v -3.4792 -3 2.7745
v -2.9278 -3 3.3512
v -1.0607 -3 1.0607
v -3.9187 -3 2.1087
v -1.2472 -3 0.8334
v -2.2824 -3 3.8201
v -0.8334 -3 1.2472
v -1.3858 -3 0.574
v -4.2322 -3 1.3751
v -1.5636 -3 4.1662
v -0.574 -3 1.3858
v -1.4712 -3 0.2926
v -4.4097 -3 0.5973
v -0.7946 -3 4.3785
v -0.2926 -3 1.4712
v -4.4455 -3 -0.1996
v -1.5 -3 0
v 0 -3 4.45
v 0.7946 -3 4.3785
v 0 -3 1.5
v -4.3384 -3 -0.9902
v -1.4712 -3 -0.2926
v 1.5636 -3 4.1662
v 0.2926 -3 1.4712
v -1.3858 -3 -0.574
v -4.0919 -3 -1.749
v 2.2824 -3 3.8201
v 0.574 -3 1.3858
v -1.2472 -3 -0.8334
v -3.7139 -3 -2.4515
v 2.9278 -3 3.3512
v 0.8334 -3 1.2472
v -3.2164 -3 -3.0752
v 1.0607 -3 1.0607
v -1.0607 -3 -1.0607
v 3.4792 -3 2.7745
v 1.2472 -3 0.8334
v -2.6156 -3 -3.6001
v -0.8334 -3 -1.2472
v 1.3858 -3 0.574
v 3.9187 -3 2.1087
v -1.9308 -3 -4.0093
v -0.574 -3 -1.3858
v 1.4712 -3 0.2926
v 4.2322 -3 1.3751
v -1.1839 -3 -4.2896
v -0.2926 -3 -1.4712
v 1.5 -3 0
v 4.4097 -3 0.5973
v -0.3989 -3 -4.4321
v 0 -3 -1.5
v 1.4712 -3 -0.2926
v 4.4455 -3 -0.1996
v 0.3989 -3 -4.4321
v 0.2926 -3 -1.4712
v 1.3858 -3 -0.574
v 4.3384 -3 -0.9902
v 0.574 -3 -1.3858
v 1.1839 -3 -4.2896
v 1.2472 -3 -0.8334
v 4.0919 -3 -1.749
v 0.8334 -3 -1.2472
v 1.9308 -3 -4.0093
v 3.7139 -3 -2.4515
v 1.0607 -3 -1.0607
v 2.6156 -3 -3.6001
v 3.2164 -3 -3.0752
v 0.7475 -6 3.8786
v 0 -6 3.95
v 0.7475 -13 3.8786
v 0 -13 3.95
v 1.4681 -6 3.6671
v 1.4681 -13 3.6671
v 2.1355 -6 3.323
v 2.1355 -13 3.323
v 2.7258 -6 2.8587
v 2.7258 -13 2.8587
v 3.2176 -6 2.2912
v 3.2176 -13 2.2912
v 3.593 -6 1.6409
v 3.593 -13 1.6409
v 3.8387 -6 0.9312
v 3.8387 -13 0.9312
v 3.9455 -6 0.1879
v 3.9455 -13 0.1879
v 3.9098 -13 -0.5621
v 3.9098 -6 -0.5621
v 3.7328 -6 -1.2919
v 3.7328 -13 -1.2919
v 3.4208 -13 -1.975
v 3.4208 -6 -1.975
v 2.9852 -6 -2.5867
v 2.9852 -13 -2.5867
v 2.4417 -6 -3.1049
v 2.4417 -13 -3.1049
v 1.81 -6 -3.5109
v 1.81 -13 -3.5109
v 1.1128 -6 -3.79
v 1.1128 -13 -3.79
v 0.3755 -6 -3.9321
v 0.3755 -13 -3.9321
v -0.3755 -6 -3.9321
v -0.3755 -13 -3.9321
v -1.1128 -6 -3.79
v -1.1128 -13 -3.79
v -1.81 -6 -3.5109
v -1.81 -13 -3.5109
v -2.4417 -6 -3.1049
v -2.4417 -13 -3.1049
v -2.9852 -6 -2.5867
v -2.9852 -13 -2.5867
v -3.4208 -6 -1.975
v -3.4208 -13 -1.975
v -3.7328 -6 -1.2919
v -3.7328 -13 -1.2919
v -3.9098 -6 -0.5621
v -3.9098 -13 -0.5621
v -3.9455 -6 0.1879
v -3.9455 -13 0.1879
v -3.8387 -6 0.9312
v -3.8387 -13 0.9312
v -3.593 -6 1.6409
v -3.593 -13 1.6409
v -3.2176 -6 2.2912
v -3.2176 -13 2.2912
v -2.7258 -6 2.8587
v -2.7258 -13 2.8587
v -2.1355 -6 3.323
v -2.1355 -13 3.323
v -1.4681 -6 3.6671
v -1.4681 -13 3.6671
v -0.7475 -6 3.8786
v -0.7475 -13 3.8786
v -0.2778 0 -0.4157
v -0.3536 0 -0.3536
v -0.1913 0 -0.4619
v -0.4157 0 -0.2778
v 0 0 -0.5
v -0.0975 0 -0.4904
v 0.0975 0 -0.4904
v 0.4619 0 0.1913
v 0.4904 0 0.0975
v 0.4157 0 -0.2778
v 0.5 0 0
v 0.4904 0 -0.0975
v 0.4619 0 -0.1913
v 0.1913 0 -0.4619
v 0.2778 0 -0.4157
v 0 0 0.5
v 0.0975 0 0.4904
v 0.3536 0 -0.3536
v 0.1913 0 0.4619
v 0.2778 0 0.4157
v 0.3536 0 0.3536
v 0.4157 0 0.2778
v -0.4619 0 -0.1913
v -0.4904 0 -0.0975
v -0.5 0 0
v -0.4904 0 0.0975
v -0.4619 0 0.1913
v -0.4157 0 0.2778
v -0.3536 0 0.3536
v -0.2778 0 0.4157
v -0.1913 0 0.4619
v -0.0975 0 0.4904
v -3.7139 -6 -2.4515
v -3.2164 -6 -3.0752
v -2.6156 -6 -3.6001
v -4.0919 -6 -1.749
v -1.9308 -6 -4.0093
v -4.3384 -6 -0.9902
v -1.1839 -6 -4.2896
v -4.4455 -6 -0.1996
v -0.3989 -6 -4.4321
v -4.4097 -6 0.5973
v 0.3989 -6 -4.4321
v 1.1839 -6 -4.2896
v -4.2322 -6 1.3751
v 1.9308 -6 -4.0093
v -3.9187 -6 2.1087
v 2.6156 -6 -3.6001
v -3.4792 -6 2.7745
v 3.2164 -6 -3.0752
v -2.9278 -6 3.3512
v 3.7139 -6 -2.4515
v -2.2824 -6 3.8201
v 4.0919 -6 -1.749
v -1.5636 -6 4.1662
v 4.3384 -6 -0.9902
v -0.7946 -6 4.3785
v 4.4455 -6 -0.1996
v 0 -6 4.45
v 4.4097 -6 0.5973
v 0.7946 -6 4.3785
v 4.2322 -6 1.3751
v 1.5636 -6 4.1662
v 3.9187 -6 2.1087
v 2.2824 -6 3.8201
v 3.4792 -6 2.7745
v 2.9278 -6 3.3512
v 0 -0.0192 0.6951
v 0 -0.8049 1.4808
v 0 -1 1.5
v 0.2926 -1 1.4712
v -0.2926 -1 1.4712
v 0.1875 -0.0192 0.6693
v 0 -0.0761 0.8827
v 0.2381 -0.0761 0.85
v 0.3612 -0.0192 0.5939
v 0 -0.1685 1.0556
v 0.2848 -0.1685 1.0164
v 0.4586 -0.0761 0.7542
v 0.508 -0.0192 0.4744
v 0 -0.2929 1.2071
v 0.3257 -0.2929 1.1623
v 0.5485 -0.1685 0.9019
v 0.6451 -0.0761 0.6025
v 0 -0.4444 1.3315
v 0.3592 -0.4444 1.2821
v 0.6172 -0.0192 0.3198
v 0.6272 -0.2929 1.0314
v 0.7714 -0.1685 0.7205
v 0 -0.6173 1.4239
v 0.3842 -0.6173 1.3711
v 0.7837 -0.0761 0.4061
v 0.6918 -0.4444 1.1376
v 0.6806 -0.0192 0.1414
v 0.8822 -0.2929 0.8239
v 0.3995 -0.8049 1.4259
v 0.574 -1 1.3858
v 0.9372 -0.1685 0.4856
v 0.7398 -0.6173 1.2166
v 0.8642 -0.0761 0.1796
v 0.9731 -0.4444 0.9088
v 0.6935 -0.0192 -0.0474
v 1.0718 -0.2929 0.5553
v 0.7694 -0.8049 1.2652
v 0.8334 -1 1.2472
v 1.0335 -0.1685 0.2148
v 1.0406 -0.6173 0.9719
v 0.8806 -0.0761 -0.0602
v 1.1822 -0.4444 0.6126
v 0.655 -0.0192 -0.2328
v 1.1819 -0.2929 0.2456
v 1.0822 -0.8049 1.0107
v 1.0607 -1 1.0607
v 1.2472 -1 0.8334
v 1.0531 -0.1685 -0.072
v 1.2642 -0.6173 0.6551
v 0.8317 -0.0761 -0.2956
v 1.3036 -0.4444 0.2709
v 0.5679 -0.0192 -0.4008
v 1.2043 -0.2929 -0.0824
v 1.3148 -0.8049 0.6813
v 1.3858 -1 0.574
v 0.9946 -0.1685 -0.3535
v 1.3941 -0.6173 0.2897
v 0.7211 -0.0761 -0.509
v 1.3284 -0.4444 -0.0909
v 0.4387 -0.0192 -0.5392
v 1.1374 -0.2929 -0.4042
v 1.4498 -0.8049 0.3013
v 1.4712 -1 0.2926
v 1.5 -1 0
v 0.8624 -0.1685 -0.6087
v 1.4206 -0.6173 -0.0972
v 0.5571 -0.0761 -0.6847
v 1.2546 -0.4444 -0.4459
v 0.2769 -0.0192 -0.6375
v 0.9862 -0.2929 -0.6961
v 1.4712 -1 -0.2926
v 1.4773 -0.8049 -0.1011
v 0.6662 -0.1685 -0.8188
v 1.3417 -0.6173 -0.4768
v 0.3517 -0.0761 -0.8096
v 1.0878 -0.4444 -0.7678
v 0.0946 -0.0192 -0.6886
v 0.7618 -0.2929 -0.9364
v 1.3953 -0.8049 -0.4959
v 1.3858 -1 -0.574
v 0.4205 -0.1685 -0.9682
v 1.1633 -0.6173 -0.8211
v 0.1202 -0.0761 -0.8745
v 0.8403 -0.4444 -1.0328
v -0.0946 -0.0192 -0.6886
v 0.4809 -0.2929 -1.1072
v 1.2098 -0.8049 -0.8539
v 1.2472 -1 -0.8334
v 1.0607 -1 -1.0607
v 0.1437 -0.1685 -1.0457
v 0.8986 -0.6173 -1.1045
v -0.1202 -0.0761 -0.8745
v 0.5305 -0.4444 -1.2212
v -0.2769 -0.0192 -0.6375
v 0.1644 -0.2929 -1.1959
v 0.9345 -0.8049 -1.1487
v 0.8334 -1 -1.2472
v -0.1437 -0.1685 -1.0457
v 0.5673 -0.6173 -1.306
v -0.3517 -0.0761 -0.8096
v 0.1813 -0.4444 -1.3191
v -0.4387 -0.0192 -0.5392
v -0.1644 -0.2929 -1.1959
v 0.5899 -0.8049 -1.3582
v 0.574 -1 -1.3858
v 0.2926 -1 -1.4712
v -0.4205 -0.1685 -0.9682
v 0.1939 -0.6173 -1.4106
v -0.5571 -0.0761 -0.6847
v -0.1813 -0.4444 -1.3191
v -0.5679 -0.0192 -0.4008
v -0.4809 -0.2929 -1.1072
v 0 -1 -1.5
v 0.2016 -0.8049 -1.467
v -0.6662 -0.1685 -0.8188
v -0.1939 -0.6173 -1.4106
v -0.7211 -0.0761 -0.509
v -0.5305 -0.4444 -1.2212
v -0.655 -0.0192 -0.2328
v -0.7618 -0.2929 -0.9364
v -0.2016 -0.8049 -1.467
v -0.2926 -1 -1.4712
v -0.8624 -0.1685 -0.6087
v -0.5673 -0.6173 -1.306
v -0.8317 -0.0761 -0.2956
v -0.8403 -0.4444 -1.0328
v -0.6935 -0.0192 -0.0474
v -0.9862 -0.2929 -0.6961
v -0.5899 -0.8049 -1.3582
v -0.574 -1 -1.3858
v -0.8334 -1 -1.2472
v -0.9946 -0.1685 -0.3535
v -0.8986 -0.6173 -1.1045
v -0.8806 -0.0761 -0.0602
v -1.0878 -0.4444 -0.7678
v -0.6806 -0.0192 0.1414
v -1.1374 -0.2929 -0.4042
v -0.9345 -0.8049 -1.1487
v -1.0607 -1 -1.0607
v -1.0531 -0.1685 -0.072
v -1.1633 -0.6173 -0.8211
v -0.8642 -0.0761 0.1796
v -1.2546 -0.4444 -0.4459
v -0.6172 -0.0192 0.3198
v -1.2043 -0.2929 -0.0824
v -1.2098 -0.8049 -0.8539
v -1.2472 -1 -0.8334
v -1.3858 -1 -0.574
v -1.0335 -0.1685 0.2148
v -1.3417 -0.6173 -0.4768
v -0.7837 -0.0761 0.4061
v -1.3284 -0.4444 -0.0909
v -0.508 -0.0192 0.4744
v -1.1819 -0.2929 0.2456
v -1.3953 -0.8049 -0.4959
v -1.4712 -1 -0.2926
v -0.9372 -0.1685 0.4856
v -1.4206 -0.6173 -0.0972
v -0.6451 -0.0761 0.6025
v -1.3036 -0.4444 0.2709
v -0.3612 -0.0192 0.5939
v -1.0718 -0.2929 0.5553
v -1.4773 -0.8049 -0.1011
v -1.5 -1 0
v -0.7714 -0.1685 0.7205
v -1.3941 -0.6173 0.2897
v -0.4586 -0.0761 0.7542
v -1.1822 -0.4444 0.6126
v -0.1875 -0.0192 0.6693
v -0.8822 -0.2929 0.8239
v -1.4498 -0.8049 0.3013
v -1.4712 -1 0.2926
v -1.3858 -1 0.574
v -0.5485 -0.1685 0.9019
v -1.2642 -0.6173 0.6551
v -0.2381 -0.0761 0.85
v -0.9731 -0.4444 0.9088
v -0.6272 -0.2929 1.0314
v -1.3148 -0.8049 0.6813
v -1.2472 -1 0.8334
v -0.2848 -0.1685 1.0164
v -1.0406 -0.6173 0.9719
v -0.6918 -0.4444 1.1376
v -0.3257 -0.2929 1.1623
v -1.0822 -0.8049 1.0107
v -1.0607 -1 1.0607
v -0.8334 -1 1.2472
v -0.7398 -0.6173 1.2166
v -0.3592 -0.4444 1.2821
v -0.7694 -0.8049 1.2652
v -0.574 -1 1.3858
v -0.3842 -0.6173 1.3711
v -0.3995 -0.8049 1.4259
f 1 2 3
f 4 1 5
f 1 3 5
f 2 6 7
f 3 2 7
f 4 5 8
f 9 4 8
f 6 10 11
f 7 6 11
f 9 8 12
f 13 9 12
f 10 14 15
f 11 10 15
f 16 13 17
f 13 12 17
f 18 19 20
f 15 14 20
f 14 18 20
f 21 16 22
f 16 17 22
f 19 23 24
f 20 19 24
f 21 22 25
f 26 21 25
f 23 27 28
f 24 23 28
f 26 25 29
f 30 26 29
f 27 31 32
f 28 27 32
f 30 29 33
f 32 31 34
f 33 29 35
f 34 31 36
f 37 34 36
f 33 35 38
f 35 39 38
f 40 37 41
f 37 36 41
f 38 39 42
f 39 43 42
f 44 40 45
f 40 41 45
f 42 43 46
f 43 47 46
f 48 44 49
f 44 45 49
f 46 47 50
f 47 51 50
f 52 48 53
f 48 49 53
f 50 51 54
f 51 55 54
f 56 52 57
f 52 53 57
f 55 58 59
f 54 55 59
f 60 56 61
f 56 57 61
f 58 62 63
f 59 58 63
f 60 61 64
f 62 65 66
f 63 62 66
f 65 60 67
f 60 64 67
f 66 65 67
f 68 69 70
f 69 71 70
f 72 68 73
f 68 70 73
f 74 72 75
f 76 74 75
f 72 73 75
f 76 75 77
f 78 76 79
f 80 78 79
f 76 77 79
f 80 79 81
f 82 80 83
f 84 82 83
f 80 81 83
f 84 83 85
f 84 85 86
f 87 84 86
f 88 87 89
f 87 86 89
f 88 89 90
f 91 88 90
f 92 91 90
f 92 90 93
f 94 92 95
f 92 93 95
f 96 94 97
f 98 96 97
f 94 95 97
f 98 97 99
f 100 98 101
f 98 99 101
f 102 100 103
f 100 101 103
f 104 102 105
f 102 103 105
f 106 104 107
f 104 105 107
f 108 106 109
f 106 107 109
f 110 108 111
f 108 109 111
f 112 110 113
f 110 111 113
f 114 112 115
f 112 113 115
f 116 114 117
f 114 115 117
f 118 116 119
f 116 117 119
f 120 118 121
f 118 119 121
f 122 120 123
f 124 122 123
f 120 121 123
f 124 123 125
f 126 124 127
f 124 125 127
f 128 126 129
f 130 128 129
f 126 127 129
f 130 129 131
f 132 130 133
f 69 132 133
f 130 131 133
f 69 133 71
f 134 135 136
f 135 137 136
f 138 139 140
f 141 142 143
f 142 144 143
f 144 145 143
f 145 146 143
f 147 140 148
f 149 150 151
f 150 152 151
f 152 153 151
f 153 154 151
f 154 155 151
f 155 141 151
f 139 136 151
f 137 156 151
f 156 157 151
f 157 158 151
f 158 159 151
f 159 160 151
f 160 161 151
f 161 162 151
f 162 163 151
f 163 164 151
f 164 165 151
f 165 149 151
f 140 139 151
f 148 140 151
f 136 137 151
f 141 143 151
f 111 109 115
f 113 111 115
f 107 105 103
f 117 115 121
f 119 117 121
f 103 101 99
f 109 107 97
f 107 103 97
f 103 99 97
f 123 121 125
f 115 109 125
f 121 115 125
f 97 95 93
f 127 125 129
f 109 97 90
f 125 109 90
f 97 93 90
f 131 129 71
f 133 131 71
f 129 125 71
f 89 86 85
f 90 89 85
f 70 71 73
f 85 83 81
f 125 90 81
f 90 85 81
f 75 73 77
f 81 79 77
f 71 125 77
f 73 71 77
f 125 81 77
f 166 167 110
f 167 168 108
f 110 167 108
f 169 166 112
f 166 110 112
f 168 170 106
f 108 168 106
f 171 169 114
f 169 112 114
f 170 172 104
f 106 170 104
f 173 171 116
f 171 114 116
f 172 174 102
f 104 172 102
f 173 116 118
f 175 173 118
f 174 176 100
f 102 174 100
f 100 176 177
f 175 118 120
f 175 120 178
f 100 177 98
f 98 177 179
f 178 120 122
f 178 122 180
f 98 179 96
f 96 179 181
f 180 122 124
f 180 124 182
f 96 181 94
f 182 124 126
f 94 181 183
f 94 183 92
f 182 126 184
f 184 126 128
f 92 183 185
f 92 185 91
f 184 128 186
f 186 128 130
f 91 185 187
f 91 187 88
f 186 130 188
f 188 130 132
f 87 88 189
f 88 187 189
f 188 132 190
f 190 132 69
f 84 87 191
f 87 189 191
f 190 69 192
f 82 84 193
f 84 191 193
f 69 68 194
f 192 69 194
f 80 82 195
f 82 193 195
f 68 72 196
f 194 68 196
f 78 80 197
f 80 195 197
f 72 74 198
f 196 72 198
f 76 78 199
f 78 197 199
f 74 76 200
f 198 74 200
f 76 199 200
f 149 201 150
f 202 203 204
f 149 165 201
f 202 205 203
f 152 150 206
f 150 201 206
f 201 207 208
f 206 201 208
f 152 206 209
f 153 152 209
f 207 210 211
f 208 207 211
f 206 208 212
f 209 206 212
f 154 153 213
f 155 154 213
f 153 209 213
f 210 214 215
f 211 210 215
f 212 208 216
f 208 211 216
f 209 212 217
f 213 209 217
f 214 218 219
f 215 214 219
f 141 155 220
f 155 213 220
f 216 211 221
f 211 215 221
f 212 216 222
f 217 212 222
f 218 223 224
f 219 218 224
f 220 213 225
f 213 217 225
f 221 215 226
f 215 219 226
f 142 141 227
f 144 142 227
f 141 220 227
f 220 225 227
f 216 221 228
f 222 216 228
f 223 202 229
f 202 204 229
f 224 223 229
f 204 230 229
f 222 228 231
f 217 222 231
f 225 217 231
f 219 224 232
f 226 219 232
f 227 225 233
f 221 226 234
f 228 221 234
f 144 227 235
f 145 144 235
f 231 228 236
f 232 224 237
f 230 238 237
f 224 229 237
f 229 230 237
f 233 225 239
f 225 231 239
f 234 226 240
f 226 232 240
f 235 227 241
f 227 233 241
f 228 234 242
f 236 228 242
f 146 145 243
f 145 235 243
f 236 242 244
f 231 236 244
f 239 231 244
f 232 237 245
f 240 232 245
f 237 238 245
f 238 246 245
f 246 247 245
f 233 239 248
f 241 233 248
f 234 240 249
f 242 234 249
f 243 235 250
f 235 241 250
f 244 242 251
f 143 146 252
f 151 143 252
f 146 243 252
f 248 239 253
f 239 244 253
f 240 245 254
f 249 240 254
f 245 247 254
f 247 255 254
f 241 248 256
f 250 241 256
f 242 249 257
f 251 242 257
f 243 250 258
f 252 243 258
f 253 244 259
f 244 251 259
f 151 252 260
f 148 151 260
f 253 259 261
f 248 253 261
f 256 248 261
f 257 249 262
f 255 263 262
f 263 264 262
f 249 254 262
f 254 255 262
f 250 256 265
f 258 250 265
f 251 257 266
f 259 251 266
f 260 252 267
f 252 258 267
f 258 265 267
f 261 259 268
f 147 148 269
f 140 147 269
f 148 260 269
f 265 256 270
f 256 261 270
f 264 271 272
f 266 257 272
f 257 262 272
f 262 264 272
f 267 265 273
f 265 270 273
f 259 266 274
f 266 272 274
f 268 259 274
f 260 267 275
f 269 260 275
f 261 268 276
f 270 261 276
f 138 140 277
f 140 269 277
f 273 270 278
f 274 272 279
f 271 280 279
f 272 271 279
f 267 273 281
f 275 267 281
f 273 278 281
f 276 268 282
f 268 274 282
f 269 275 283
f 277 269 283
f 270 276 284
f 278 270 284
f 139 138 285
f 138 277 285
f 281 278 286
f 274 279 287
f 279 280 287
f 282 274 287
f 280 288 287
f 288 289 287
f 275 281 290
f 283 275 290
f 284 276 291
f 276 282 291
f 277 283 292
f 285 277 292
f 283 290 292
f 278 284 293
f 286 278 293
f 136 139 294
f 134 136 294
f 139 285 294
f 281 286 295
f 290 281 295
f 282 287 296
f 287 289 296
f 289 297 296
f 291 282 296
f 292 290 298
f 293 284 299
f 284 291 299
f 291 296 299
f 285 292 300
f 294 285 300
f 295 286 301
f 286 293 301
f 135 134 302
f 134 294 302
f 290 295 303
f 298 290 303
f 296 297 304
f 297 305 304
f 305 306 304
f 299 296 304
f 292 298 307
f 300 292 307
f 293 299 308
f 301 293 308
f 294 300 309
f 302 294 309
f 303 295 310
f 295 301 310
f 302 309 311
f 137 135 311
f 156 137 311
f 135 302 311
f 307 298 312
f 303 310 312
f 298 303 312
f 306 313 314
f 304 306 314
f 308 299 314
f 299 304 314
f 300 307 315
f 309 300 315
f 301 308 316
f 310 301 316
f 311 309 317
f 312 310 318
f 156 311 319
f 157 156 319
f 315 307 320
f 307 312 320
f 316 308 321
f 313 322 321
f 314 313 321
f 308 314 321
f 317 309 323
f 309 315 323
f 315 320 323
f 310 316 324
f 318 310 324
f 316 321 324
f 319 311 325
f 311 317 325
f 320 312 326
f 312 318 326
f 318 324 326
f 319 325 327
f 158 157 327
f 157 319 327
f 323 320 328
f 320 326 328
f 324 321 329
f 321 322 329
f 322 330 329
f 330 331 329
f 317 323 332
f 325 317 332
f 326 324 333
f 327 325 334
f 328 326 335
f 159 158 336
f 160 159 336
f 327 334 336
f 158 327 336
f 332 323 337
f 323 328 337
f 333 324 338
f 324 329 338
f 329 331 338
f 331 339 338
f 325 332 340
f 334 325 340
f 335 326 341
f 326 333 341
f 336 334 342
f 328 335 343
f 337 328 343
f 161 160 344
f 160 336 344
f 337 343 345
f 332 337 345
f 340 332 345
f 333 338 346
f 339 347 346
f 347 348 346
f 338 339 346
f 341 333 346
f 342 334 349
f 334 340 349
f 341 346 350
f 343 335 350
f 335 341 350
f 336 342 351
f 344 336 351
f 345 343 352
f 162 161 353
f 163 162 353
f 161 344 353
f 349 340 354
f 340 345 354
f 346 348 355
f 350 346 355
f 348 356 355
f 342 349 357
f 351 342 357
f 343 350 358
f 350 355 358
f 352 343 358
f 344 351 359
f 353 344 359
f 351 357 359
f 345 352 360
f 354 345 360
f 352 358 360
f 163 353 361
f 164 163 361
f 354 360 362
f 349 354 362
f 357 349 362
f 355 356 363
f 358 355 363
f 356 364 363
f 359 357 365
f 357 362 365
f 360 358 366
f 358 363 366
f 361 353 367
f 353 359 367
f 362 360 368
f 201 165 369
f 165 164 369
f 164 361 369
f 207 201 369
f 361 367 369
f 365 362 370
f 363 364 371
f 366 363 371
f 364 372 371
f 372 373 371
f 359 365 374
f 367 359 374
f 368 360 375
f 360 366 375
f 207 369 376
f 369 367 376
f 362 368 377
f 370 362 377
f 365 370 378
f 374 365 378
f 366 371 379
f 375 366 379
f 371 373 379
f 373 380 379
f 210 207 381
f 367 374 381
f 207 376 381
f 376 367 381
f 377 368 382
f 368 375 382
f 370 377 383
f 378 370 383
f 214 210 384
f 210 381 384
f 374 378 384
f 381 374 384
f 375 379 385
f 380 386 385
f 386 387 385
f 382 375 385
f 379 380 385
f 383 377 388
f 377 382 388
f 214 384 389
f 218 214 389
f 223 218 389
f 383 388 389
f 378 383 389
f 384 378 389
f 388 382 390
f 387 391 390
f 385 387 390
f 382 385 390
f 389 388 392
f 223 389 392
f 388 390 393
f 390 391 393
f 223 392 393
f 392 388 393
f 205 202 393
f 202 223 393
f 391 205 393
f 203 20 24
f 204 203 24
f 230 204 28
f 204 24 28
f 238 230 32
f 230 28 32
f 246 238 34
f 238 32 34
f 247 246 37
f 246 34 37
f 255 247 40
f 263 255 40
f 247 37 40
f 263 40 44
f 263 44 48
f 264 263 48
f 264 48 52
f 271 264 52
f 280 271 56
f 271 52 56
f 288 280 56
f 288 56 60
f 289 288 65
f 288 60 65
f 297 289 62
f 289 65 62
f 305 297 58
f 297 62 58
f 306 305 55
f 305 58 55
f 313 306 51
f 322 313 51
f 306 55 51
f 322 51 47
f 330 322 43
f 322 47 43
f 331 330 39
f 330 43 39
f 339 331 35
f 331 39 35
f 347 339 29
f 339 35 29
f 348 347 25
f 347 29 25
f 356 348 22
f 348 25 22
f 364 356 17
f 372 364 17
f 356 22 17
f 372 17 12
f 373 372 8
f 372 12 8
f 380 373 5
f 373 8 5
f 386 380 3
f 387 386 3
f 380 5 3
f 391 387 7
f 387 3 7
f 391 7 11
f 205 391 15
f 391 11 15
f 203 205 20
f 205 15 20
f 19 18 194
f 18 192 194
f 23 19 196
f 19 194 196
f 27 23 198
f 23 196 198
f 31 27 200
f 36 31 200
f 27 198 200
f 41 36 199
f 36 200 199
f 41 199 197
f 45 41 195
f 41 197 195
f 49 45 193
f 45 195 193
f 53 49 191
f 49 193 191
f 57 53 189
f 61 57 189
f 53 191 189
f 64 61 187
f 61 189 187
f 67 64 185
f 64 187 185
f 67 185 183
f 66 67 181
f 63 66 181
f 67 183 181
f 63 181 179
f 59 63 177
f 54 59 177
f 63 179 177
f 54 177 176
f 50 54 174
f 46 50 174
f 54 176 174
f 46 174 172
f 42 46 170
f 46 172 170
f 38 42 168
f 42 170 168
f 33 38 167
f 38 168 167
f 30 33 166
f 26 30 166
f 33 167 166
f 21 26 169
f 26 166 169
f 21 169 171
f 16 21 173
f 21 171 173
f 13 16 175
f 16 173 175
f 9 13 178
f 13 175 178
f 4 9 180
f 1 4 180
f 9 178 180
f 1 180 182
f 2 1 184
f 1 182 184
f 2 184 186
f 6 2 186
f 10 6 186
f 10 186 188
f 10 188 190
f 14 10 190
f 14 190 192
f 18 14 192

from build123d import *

# Parameters (mm, degrees)
F2_R = 1


with BuildPart() as f1:
    # F0 (on Right) → F1 (revolve)
    with BuildSketch(Plane.YZ):
        Polygon((-13, 0), (0, 0), (0, 1.5), (-3, 1.5), (-3, 4.45), (-6, 4.45), (-6, 3.95), (-13, 3.95), align=None)
    revolve(axis=Axis((0, -6.5, 0), (0, 1, 0)))

    # F2
    f2_edges = [f1.edges().sort_by_distance(p)[0] for p in [
        (0, 0, -1.5),
    ]]
    fillet(f2_edges, radius=F2_R)


solid = f1.part
